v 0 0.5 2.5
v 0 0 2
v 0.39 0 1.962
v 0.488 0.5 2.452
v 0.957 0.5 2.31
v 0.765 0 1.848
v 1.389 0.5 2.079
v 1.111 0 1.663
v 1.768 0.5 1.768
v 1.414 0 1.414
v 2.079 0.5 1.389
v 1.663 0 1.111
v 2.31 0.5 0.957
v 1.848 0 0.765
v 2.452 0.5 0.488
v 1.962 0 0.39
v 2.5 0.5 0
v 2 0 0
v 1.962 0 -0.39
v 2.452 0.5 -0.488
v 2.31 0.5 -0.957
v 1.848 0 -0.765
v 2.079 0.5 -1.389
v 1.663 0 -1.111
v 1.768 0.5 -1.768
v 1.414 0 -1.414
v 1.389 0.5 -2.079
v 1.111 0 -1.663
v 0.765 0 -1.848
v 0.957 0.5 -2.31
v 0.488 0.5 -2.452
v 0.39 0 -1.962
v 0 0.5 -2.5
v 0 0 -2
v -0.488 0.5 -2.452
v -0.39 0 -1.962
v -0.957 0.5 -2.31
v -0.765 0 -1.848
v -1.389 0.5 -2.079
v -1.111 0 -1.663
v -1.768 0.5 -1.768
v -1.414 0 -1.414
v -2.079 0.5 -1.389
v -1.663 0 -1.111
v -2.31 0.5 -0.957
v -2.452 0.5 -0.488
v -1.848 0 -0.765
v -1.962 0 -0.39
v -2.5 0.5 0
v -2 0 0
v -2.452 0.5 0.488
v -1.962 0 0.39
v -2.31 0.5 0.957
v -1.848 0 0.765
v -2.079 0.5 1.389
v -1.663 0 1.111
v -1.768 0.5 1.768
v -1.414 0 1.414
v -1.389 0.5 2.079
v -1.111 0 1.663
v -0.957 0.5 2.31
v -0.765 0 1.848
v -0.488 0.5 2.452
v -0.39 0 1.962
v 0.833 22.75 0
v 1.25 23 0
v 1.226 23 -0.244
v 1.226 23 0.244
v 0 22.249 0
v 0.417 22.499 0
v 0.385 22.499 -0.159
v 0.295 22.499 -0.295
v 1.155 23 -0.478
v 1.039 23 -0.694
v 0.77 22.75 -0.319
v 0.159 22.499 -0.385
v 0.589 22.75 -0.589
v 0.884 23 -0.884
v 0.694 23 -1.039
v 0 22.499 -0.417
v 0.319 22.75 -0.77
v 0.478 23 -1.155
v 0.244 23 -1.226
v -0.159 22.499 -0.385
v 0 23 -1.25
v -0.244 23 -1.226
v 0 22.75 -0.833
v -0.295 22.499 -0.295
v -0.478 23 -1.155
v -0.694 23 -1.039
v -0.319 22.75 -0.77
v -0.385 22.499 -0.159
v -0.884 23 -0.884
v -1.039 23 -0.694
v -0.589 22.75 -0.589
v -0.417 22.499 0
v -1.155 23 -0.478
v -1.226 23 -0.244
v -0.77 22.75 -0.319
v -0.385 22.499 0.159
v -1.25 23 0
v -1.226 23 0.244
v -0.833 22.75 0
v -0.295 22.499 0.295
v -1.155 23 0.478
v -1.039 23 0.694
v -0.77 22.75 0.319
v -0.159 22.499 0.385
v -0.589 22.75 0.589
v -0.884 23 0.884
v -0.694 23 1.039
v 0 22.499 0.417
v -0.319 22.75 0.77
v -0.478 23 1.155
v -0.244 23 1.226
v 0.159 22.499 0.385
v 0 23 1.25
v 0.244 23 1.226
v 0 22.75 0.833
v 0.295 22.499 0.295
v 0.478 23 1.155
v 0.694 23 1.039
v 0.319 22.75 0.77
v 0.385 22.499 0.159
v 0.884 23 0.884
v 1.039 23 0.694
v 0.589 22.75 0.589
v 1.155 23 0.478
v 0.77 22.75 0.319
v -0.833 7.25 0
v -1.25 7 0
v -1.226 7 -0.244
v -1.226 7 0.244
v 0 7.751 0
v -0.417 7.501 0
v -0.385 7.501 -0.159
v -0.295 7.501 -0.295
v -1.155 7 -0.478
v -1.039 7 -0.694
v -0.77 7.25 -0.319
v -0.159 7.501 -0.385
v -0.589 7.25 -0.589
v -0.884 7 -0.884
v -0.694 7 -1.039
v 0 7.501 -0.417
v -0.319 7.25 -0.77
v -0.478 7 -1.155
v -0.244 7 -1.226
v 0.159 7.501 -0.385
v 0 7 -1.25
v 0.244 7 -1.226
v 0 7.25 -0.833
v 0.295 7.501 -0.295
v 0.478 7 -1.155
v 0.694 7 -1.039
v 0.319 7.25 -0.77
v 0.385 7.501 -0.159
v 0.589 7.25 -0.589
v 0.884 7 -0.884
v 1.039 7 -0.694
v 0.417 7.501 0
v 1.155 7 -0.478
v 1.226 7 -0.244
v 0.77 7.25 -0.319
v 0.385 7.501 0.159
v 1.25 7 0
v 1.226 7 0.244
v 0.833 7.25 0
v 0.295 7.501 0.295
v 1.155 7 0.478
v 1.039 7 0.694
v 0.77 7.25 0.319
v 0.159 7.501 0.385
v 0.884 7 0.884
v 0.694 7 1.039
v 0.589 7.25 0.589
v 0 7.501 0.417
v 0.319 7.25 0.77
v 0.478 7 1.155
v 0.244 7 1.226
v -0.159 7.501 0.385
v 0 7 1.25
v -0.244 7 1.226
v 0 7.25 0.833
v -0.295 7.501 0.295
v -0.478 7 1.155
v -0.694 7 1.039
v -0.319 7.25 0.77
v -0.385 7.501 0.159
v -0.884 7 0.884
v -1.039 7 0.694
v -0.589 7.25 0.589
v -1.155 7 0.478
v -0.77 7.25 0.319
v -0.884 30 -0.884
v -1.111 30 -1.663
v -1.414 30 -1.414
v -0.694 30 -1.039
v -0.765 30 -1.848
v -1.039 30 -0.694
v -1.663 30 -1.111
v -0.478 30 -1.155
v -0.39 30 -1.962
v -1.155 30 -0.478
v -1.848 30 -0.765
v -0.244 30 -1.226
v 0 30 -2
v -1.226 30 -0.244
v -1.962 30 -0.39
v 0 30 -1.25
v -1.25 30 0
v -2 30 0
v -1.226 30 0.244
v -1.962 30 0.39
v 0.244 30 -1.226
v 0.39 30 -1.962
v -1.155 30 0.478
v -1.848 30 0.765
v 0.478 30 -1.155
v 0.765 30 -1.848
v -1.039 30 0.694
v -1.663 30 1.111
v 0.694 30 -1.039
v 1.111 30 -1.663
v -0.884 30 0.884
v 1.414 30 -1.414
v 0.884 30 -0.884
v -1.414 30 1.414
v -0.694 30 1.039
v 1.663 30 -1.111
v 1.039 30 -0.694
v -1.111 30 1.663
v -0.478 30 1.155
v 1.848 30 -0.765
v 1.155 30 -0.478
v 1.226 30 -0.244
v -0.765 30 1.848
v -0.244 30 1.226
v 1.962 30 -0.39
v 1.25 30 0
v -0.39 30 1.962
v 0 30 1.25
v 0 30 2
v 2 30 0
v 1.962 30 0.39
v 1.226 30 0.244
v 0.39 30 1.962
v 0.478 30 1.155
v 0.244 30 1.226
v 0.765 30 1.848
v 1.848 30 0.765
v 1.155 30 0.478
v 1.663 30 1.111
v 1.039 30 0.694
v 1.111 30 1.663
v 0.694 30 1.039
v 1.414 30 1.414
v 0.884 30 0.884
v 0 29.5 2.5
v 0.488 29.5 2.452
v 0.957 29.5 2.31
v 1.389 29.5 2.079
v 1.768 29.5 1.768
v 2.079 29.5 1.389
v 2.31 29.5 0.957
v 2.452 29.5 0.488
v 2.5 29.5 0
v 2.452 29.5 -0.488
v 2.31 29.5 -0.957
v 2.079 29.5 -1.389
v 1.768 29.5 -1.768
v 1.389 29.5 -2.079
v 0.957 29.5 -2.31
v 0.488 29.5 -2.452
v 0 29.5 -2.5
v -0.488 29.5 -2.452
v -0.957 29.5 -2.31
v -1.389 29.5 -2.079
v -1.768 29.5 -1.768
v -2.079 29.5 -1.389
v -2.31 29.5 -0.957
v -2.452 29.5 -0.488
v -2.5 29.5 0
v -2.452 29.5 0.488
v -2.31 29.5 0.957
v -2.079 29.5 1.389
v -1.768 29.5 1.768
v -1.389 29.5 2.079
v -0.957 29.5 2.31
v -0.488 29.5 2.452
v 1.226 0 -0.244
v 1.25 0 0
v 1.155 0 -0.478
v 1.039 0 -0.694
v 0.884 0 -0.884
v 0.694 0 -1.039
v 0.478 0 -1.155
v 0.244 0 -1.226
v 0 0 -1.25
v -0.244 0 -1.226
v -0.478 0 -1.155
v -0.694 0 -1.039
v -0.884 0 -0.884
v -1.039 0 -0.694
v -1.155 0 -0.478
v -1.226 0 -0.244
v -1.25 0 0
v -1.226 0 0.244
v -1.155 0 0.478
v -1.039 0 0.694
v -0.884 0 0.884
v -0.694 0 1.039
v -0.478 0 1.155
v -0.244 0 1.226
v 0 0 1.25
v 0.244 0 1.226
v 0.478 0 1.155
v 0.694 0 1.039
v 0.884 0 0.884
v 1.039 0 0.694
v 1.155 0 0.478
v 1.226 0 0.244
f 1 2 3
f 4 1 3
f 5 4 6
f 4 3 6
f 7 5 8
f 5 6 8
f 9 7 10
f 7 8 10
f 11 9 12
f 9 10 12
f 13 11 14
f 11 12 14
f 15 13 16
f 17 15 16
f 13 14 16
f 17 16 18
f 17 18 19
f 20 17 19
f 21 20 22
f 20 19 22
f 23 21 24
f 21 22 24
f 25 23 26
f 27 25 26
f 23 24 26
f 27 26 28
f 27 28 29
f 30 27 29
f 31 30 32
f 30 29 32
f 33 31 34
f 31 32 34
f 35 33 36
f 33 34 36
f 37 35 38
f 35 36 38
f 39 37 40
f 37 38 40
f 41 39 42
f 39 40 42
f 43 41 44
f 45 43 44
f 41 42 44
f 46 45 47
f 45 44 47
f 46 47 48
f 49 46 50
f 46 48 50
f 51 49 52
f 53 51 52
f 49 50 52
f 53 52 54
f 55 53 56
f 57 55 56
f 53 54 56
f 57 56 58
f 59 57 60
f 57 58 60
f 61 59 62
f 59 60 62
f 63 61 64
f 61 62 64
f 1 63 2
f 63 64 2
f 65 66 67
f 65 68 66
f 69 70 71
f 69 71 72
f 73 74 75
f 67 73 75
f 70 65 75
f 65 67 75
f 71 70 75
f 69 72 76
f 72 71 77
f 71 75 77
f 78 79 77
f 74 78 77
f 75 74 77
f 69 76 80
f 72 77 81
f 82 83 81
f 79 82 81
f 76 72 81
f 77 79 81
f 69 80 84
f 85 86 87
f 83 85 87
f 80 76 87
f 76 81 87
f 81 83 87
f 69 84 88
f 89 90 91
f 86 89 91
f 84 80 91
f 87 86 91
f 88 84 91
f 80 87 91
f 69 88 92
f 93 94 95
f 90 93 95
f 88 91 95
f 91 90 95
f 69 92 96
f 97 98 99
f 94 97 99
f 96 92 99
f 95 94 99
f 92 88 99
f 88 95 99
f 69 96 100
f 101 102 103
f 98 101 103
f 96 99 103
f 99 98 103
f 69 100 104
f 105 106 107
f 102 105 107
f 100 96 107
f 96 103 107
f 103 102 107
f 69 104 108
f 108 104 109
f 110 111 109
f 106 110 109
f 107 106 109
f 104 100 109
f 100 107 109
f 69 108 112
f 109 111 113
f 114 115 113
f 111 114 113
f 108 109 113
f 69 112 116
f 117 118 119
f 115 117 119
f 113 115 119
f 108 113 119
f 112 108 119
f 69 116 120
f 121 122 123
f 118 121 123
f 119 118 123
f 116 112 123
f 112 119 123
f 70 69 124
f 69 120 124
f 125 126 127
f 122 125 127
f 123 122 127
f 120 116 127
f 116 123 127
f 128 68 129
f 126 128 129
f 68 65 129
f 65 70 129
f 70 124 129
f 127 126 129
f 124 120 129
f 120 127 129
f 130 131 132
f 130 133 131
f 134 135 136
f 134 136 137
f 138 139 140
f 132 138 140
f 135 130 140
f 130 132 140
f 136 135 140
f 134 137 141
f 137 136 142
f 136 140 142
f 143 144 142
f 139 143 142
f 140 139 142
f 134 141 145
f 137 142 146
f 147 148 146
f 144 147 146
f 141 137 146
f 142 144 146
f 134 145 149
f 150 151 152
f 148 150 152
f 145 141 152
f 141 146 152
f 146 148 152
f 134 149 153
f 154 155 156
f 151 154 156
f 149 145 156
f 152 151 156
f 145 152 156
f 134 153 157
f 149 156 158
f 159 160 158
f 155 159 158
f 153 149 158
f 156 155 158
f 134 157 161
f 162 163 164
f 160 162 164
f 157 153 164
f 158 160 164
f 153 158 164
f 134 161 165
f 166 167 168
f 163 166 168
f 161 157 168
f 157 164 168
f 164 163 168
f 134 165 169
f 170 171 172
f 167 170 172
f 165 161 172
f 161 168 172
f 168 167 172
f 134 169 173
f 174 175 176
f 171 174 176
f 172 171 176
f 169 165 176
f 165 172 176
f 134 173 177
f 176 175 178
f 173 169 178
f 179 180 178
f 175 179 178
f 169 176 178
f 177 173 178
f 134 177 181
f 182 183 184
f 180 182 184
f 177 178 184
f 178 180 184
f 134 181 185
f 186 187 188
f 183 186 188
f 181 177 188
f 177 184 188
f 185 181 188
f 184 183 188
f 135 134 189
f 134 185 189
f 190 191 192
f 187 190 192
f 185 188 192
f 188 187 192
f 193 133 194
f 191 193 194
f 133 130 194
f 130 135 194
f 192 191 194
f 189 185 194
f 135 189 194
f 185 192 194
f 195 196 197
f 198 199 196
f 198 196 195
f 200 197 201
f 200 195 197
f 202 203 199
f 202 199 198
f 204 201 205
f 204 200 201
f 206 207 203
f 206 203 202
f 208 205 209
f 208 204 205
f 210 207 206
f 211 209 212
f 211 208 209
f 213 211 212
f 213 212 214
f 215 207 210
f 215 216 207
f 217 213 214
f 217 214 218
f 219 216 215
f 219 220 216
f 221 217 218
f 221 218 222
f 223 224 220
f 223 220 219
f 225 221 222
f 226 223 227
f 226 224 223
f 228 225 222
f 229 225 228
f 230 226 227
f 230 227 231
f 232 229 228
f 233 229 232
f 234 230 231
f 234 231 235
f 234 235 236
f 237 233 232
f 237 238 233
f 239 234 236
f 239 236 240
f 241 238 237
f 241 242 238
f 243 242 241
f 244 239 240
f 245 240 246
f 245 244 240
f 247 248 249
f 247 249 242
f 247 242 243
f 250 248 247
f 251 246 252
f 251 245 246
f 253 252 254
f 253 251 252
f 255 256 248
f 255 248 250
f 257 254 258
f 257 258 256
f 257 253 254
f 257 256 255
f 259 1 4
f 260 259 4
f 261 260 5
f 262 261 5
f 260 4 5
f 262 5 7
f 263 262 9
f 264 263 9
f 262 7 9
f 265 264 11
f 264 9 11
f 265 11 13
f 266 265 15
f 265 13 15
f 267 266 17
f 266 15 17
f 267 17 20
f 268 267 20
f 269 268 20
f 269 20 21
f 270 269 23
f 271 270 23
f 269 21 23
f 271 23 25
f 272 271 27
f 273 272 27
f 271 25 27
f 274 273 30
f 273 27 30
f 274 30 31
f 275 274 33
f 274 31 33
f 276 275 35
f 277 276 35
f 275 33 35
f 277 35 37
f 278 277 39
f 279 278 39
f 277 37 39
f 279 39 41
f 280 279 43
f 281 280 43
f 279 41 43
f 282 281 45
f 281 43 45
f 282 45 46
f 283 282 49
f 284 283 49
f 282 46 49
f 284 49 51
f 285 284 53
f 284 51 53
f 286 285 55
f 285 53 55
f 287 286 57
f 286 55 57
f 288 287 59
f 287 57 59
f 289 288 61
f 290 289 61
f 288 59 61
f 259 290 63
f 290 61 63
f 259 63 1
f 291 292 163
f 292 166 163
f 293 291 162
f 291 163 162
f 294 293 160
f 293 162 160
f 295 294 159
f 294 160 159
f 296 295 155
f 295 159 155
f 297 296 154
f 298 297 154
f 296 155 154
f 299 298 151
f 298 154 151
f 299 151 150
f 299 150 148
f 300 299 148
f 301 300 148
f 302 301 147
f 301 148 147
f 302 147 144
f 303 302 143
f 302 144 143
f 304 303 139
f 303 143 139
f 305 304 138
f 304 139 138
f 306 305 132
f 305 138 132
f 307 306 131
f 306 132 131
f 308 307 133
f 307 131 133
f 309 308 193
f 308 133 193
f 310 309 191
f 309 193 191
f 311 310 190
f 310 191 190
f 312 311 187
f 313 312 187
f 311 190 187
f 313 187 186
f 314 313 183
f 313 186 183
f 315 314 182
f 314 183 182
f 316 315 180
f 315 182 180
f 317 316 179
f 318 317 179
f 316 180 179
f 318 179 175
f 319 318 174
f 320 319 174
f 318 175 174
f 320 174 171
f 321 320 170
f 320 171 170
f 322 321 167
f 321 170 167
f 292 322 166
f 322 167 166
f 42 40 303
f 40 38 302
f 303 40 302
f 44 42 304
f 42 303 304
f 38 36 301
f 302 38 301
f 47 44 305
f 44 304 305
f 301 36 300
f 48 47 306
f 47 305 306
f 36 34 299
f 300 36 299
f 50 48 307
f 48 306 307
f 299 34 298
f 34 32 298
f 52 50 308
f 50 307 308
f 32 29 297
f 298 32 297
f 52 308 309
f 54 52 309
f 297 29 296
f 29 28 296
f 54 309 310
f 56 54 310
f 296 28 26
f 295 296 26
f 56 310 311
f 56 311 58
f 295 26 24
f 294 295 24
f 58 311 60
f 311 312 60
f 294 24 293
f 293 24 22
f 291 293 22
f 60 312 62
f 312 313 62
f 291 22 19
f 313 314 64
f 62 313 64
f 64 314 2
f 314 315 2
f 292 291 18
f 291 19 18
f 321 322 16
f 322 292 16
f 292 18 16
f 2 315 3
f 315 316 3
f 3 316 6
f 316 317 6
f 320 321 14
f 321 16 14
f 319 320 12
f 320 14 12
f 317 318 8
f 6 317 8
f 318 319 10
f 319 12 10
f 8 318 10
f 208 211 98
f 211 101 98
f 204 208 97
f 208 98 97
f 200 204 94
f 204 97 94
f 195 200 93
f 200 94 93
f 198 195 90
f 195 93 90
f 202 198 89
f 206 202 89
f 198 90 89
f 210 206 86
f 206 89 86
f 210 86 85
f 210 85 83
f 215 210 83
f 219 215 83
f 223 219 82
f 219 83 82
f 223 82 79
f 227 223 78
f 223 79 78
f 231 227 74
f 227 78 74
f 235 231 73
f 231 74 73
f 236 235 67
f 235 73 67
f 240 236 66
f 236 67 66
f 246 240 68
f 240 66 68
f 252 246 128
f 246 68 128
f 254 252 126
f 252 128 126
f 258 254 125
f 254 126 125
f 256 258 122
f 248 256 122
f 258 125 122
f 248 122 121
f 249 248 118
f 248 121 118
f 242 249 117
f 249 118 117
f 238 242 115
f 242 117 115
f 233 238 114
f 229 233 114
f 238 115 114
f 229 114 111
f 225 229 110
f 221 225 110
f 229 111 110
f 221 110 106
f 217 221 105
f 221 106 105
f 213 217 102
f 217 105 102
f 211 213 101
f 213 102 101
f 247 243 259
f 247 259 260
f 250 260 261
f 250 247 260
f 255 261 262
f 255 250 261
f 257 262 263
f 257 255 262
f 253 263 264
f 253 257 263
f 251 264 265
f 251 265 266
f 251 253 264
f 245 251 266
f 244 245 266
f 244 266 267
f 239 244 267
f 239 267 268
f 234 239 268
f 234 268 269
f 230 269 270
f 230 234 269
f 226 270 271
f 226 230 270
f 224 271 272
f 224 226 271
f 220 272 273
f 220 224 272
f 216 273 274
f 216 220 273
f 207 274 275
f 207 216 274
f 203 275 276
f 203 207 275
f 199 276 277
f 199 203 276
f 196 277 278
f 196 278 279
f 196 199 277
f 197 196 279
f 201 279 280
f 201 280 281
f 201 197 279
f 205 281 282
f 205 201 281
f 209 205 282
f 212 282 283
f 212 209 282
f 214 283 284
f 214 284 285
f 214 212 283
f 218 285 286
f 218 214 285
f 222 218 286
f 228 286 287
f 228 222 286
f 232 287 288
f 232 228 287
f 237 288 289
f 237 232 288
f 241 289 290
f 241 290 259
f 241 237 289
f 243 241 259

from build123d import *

# Parameters (mm, degrees)
SKETCH1_R                 = 2.5
BOSS_EXTRUDE1_DEPTH       = 30
M3X0_5_TAPPED_HOLE1_D     = 2.5
M3X0_5_TAPPED_HOLE1_DEPTH = 7
M3X0_5_TAPPED_HOLE1_TIP   = 0.751075774
M3X0_5_TAPPED_HOLE2_D     = 2.5
M3X0_5_TAPPED_HOLE2_DEPTH = 7
M3X0_5_TAPPED_HOLE2_TIP   = 0.751075774
CHAMFER1_SIZE             = 0.5


with BuildPart() as part:
    # Sketch1 → Boss-Extrude1 (new body)
    with BuildSketch(Plane(origin=(0, 0, 0), x_dir=(1, 0, 0), z_dir=(0, 1, 0))):
        with Locations(Location((0, 0, 0), (0, 0, 270))):
            Circle(SKETCH1_R)
    extrude(amount=BOSS_EXTRUDE1_DEPTH)

    # M3x0.5 Tapped Hole1
    with Locations(Plane(origin=(0, 30, 0), x_dir=(1, 0, 0), z_dir=(0, 1, 0))):
        with Locations((0, 0)):
            Hole(M3X0_5_TAPPED_HOLE1_D / 2, depth=M3X0_5_TAPPED_HOLE1_DEPTH)
            with Locations((0, 0, -(M3X0_5_TAPPED_HOLE1_DEPTH + M3X0_5_TAPPED_HOLE1_TIP / 2))):  # 118° drill point
                Cone(0, M3X0_5_TAPPED_HOLE1_D / 2, M3X0_5_TAPPED_HOLE1_TIP, mode=Mode.SUBTRACT)

    # M3x0.5 Tapped Hole2
    with Locations(Plane(origin=(0, 0, 0), x_dir=(-1, 0, 0), z_dir=(0, -1, 0))):
        with Locations((0, 0)):
            Hole(M3X0_5_TAPPED_HOLE2_D / 2, depth=M3X0_5_TAPPED_HOLE2_DEPTH)
            with Locations((0, 0, -(M3X0_5_TAPPED_HOLE2_DEPTH + M3X0_5_TAPPED_HOLE2_TIP / 2))):  # 118° drill point
                Cone(0, M3X0_5_TAPPED_HOLE2_D / 2, M3X0_5_TAPPED_HOLE2_TIP, mode=Mode.SUBTRACT)

    # Chamfer1
    chamfer1_edges = [part.edges().sort_by_distance(p)[0] for p in [
        (0, 0, -2.5),
        (0, 30, -2.5),
    ]]
    chamfer(chamfer1_edges, length=CHAMFER1_SIZE)


solid = part.part
